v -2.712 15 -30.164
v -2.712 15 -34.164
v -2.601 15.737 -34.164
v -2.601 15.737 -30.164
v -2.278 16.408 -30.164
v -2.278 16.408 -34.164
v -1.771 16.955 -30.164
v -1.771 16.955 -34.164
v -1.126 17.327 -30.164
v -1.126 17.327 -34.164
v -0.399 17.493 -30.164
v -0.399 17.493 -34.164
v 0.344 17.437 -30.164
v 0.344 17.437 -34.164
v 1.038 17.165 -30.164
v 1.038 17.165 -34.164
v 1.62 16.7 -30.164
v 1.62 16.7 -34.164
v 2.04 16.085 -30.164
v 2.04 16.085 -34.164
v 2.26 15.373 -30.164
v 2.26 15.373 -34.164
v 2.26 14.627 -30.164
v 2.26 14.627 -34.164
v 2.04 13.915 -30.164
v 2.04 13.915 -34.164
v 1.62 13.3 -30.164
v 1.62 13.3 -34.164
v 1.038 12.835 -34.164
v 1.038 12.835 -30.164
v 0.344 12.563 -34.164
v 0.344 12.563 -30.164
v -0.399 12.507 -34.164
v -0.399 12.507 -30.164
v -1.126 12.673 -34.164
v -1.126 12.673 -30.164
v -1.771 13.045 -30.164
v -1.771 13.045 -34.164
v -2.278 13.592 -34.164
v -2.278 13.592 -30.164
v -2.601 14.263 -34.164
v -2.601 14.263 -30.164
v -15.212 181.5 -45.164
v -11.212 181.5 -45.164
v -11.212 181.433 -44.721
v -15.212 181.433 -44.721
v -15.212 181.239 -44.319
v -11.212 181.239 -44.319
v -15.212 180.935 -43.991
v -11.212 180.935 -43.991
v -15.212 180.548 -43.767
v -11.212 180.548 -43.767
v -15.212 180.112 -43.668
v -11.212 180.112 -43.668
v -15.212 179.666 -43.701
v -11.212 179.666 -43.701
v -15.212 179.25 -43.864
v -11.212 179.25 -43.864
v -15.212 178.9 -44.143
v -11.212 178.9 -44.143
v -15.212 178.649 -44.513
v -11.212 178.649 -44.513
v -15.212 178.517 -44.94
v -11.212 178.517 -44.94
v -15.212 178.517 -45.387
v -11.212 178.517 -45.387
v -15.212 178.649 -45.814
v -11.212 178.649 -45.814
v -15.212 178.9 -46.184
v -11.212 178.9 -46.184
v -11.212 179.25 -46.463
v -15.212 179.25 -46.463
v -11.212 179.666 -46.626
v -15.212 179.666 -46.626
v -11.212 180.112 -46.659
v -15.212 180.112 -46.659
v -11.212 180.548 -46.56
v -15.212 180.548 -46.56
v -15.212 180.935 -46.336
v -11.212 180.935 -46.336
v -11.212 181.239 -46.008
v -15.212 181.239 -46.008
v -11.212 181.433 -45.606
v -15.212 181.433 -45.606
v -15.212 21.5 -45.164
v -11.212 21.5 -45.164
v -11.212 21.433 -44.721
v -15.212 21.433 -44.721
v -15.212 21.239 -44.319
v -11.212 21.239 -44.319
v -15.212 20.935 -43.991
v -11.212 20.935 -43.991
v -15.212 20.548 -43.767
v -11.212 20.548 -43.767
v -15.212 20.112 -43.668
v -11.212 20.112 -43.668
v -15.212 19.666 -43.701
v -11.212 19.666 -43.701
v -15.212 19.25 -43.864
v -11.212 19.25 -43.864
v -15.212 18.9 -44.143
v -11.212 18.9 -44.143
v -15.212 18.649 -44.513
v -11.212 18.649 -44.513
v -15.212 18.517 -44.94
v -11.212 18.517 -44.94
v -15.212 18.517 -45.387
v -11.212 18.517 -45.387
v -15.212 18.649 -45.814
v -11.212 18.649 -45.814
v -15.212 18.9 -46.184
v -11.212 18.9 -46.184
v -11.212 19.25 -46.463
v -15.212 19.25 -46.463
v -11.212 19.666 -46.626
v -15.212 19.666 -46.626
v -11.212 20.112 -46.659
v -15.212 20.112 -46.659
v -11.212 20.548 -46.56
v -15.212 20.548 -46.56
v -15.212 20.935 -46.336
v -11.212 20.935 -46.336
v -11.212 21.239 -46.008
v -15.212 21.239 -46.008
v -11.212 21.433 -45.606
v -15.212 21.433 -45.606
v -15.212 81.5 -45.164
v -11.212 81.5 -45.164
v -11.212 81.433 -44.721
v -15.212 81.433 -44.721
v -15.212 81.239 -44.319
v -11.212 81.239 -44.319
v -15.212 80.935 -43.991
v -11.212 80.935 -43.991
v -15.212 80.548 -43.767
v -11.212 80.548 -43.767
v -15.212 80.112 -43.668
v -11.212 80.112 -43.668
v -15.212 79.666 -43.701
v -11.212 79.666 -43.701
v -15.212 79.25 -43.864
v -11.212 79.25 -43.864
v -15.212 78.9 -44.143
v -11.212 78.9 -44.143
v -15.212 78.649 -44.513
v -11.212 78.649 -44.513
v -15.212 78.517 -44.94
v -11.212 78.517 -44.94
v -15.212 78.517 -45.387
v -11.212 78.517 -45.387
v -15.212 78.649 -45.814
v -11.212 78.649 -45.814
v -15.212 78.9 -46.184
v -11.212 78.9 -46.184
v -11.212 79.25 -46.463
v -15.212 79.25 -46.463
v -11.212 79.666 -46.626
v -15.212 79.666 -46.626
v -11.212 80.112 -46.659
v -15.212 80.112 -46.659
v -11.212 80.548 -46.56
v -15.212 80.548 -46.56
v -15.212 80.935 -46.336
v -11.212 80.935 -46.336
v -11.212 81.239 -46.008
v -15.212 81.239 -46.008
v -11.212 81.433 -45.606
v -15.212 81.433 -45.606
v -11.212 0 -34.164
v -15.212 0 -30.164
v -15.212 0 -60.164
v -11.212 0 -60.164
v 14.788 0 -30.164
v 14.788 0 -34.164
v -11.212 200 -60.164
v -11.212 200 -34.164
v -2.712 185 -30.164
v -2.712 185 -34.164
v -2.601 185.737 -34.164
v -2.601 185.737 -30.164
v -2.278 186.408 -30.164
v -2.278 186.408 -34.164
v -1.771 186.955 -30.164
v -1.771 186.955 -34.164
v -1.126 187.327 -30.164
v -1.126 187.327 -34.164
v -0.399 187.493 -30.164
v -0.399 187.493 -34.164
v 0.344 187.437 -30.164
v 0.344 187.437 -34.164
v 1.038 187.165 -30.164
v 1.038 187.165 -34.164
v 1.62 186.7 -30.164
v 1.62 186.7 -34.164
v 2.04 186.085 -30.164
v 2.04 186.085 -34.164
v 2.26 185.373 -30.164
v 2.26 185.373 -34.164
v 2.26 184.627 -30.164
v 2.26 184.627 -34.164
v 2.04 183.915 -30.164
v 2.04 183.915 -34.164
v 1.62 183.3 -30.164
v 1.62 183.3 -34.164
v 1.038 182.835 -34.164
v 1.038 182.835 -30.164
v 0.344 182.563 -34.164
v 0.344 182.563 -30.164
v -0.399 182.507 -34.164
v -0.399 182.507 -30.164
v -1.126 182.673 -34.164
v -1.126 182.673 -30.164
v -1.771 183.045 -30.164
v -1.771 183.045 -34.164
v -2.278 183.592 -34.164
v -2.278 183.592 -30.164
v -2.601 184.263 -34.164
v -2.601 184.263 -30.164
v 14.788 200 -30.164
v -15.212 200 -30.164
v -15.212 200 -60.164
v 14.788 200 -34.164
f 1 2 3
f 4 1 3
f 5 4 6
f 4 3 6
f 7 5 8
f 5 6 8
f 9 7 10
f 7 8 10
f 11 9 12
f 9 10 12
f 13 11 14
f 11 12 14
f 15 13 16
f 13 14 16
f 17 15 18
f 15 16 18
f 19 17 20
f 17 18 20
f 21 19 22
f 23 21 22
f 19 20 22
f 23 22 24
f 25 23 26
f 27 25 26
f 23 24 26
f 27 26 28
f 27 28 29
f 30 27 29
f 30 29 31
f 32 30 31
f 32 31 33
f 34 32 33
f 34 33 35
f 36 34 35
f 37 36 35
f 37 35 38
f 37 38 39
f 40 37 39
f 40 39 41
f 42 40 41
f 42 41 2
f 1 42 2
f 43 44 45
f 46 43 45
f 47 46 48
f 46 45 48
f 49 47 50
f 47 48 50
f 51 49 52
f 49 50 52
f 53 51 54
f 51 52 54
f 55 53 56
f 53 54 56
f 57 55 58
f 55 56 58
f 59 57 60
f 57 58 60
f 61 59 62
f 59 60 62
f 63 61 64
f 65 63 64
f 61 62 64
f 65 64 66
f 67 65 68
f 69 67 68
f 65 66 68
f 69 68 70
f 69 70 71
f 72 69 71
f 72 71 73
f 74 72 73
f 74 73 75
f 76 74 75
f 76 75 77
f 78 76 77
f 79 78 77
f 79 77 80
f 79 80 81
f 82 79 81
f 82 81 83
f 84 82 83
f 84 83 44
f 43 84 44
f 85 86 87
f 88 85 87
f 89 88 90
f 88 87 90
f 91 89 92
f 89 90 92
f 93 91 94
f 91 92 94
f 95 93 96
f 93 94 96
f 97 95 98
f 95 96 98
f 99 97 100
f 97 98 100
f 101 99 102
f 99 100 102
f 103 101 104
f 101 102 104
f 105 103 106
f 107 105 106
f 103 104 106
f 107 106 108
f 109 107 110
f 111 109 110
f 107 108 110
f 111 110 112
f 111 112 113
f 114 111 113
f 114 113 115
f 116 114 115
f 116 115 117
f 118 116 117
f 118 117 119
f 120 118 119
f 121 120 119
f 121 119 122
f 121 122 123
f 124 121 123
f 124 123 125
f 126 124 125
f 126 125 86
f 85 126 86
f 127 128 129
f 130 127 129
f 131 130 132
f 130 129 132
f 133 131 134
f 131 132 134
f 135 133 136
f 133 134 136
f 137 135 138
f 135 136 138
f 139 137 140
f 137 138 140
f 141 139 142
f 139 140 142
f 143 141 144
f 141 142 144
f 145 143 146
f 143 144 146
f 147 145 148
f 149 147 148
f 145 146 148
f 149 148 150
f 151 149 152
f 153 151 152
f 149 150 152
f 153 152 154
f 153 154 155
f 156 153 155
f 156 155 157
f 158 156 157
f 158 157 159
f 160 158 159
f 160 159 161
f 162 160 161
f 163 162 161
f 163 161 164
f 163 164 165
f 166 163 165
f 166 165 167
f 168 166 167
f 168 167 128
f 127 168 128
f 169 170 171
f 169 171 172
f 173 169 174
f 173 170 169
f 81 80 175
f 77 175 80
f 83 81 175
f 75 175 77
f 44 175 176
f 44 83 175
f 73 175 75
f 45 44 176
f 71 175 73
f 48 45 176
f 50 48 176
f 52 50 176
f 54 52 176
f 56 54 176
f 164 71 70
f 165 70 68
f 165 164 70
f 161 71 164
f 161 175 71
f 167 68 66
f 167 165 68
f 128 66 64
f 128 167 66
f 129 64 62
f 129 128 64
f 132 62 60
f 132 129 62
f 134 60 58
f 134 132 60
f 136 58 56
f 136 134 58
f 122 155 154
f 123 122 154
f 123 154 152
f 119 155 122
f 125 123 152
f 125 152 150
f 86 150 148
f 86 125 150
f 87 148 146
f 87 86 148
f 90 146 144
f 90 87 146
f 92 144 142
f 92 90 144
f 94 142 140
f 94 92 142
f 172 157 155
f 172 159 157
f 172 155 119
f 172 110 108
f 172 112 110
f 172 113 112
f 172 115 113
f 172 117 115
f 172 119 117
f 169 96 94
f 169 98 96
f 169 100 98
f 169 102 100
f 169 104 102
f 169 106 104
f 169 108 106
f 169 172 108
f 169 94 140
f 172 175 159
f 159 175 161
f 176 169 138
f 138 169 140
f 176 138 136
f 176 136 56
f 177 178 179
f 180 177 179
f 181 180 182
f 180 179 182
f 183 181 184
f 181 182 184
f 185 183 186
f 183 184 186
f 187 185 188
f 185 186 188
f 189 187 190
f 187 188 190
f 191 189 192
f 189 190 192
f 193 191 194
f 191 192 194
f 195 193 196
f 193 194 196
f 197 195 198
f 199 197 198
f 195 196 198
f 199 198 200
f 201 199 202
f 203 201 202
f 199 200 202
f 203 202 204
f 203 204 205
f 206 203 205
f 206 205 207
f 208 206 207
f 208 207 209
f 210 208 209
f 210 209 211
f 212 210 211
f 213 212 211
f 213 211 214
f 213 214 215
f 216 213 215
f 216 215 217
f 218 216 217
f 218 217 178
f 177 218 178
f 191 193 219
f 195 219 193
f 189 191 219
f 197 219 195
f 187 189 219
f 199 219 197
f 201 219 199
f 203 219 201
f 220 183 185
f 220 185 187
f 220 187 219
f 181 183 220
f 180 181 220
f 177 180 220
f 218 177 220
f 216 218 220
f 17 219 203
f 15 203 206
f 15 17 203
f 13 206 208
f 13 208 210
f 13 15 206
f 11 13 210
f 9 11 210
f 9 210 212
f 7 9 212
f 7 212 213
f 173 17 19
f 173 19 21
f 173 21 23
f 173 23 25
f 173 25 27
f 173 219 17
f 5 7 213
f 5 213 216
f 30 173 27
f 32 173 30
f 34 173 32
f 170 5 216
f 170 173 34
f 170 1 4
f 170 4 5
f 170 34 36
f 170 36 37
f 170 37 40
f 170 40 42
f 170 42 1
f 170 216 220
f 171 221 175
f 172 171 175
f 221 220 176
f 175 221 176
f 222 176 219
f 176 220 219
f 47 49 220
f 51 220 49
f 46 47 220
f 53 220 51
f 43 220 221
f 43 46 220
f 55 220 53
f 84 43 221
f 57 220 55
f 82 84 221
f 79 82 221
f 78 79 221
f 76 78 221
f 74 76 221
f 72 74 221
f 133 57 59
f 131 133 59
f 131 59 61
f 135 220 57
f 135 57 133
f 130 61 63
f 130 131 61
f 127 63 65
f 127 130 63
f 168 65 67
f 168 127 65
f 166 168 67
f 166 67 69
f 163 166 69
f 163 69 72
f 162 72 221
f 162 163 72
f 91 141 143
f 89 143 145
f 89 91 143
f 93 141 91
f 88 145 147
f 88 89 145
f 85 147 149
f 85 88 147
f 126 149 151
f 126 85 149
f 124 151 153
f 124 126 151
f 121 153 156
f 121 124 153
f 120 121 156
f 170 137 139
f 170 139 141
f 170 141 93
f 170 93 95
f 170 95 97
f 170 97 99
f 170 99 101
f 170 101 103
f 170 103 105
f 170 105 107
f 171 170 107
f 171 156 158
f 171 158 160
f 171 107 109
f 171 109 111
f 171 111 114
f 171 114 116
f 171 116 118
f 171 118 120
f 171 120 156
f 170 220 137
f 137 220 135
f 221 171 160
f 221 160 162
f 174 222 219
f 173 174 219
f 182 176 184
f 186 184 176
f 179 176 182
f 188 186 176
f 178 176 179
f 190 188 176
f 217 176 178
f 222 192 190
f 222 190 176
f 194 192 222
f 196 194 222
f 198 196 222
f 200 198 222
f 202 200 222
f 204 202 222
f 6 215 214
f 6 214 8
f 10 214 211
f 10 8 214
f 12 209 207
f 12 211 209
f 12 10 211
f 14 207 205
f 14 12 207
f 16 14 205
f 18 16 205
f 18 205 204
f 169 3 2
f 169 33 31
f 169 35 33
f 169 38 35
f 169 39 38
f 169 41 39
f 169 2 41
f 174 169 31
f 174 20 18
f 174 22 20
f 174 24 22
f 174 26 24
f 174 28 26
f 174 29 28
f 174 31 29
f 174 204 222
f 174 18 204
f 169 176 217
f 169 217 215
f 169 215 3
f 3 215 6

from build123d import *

# Parameters (mm, degrees)
F1_DEPTH = 200
F4_D     = 3
F6_D     = 5


with BuildPart() as f1:
    # F0 (on Front) → F1 (new body)
    with BuildSketch(Plane.XZ):
        Polygon((-11.212291, -34.163514), (14.787709, -34.163514), (14.787709, -30.163514), (-15.212291, -30.163514), (-15.212291, -60.163514), (-11.212291, -60.163514), align=None)
    extrude(amount=-F1_DEPTH)

    # F4 (through all)
    with Locations(Plane(origin=(-15.212291, 0, 0), x_dir=(0, -1, 0), z_dir=(-1, 0, 0))):
        with Locations((-20, -45.163514), (-80, -45.163514), (-180, -45.163514)):
            Hole(F4_D / 2)

    # F6 (through all)
    with Locations(Plane.XY.offset(-30.163514)):
        with Locations((-0.212291, 185), (-0.212291, 15)):
            Hole(F6_D / 2)


solid = f1.part
